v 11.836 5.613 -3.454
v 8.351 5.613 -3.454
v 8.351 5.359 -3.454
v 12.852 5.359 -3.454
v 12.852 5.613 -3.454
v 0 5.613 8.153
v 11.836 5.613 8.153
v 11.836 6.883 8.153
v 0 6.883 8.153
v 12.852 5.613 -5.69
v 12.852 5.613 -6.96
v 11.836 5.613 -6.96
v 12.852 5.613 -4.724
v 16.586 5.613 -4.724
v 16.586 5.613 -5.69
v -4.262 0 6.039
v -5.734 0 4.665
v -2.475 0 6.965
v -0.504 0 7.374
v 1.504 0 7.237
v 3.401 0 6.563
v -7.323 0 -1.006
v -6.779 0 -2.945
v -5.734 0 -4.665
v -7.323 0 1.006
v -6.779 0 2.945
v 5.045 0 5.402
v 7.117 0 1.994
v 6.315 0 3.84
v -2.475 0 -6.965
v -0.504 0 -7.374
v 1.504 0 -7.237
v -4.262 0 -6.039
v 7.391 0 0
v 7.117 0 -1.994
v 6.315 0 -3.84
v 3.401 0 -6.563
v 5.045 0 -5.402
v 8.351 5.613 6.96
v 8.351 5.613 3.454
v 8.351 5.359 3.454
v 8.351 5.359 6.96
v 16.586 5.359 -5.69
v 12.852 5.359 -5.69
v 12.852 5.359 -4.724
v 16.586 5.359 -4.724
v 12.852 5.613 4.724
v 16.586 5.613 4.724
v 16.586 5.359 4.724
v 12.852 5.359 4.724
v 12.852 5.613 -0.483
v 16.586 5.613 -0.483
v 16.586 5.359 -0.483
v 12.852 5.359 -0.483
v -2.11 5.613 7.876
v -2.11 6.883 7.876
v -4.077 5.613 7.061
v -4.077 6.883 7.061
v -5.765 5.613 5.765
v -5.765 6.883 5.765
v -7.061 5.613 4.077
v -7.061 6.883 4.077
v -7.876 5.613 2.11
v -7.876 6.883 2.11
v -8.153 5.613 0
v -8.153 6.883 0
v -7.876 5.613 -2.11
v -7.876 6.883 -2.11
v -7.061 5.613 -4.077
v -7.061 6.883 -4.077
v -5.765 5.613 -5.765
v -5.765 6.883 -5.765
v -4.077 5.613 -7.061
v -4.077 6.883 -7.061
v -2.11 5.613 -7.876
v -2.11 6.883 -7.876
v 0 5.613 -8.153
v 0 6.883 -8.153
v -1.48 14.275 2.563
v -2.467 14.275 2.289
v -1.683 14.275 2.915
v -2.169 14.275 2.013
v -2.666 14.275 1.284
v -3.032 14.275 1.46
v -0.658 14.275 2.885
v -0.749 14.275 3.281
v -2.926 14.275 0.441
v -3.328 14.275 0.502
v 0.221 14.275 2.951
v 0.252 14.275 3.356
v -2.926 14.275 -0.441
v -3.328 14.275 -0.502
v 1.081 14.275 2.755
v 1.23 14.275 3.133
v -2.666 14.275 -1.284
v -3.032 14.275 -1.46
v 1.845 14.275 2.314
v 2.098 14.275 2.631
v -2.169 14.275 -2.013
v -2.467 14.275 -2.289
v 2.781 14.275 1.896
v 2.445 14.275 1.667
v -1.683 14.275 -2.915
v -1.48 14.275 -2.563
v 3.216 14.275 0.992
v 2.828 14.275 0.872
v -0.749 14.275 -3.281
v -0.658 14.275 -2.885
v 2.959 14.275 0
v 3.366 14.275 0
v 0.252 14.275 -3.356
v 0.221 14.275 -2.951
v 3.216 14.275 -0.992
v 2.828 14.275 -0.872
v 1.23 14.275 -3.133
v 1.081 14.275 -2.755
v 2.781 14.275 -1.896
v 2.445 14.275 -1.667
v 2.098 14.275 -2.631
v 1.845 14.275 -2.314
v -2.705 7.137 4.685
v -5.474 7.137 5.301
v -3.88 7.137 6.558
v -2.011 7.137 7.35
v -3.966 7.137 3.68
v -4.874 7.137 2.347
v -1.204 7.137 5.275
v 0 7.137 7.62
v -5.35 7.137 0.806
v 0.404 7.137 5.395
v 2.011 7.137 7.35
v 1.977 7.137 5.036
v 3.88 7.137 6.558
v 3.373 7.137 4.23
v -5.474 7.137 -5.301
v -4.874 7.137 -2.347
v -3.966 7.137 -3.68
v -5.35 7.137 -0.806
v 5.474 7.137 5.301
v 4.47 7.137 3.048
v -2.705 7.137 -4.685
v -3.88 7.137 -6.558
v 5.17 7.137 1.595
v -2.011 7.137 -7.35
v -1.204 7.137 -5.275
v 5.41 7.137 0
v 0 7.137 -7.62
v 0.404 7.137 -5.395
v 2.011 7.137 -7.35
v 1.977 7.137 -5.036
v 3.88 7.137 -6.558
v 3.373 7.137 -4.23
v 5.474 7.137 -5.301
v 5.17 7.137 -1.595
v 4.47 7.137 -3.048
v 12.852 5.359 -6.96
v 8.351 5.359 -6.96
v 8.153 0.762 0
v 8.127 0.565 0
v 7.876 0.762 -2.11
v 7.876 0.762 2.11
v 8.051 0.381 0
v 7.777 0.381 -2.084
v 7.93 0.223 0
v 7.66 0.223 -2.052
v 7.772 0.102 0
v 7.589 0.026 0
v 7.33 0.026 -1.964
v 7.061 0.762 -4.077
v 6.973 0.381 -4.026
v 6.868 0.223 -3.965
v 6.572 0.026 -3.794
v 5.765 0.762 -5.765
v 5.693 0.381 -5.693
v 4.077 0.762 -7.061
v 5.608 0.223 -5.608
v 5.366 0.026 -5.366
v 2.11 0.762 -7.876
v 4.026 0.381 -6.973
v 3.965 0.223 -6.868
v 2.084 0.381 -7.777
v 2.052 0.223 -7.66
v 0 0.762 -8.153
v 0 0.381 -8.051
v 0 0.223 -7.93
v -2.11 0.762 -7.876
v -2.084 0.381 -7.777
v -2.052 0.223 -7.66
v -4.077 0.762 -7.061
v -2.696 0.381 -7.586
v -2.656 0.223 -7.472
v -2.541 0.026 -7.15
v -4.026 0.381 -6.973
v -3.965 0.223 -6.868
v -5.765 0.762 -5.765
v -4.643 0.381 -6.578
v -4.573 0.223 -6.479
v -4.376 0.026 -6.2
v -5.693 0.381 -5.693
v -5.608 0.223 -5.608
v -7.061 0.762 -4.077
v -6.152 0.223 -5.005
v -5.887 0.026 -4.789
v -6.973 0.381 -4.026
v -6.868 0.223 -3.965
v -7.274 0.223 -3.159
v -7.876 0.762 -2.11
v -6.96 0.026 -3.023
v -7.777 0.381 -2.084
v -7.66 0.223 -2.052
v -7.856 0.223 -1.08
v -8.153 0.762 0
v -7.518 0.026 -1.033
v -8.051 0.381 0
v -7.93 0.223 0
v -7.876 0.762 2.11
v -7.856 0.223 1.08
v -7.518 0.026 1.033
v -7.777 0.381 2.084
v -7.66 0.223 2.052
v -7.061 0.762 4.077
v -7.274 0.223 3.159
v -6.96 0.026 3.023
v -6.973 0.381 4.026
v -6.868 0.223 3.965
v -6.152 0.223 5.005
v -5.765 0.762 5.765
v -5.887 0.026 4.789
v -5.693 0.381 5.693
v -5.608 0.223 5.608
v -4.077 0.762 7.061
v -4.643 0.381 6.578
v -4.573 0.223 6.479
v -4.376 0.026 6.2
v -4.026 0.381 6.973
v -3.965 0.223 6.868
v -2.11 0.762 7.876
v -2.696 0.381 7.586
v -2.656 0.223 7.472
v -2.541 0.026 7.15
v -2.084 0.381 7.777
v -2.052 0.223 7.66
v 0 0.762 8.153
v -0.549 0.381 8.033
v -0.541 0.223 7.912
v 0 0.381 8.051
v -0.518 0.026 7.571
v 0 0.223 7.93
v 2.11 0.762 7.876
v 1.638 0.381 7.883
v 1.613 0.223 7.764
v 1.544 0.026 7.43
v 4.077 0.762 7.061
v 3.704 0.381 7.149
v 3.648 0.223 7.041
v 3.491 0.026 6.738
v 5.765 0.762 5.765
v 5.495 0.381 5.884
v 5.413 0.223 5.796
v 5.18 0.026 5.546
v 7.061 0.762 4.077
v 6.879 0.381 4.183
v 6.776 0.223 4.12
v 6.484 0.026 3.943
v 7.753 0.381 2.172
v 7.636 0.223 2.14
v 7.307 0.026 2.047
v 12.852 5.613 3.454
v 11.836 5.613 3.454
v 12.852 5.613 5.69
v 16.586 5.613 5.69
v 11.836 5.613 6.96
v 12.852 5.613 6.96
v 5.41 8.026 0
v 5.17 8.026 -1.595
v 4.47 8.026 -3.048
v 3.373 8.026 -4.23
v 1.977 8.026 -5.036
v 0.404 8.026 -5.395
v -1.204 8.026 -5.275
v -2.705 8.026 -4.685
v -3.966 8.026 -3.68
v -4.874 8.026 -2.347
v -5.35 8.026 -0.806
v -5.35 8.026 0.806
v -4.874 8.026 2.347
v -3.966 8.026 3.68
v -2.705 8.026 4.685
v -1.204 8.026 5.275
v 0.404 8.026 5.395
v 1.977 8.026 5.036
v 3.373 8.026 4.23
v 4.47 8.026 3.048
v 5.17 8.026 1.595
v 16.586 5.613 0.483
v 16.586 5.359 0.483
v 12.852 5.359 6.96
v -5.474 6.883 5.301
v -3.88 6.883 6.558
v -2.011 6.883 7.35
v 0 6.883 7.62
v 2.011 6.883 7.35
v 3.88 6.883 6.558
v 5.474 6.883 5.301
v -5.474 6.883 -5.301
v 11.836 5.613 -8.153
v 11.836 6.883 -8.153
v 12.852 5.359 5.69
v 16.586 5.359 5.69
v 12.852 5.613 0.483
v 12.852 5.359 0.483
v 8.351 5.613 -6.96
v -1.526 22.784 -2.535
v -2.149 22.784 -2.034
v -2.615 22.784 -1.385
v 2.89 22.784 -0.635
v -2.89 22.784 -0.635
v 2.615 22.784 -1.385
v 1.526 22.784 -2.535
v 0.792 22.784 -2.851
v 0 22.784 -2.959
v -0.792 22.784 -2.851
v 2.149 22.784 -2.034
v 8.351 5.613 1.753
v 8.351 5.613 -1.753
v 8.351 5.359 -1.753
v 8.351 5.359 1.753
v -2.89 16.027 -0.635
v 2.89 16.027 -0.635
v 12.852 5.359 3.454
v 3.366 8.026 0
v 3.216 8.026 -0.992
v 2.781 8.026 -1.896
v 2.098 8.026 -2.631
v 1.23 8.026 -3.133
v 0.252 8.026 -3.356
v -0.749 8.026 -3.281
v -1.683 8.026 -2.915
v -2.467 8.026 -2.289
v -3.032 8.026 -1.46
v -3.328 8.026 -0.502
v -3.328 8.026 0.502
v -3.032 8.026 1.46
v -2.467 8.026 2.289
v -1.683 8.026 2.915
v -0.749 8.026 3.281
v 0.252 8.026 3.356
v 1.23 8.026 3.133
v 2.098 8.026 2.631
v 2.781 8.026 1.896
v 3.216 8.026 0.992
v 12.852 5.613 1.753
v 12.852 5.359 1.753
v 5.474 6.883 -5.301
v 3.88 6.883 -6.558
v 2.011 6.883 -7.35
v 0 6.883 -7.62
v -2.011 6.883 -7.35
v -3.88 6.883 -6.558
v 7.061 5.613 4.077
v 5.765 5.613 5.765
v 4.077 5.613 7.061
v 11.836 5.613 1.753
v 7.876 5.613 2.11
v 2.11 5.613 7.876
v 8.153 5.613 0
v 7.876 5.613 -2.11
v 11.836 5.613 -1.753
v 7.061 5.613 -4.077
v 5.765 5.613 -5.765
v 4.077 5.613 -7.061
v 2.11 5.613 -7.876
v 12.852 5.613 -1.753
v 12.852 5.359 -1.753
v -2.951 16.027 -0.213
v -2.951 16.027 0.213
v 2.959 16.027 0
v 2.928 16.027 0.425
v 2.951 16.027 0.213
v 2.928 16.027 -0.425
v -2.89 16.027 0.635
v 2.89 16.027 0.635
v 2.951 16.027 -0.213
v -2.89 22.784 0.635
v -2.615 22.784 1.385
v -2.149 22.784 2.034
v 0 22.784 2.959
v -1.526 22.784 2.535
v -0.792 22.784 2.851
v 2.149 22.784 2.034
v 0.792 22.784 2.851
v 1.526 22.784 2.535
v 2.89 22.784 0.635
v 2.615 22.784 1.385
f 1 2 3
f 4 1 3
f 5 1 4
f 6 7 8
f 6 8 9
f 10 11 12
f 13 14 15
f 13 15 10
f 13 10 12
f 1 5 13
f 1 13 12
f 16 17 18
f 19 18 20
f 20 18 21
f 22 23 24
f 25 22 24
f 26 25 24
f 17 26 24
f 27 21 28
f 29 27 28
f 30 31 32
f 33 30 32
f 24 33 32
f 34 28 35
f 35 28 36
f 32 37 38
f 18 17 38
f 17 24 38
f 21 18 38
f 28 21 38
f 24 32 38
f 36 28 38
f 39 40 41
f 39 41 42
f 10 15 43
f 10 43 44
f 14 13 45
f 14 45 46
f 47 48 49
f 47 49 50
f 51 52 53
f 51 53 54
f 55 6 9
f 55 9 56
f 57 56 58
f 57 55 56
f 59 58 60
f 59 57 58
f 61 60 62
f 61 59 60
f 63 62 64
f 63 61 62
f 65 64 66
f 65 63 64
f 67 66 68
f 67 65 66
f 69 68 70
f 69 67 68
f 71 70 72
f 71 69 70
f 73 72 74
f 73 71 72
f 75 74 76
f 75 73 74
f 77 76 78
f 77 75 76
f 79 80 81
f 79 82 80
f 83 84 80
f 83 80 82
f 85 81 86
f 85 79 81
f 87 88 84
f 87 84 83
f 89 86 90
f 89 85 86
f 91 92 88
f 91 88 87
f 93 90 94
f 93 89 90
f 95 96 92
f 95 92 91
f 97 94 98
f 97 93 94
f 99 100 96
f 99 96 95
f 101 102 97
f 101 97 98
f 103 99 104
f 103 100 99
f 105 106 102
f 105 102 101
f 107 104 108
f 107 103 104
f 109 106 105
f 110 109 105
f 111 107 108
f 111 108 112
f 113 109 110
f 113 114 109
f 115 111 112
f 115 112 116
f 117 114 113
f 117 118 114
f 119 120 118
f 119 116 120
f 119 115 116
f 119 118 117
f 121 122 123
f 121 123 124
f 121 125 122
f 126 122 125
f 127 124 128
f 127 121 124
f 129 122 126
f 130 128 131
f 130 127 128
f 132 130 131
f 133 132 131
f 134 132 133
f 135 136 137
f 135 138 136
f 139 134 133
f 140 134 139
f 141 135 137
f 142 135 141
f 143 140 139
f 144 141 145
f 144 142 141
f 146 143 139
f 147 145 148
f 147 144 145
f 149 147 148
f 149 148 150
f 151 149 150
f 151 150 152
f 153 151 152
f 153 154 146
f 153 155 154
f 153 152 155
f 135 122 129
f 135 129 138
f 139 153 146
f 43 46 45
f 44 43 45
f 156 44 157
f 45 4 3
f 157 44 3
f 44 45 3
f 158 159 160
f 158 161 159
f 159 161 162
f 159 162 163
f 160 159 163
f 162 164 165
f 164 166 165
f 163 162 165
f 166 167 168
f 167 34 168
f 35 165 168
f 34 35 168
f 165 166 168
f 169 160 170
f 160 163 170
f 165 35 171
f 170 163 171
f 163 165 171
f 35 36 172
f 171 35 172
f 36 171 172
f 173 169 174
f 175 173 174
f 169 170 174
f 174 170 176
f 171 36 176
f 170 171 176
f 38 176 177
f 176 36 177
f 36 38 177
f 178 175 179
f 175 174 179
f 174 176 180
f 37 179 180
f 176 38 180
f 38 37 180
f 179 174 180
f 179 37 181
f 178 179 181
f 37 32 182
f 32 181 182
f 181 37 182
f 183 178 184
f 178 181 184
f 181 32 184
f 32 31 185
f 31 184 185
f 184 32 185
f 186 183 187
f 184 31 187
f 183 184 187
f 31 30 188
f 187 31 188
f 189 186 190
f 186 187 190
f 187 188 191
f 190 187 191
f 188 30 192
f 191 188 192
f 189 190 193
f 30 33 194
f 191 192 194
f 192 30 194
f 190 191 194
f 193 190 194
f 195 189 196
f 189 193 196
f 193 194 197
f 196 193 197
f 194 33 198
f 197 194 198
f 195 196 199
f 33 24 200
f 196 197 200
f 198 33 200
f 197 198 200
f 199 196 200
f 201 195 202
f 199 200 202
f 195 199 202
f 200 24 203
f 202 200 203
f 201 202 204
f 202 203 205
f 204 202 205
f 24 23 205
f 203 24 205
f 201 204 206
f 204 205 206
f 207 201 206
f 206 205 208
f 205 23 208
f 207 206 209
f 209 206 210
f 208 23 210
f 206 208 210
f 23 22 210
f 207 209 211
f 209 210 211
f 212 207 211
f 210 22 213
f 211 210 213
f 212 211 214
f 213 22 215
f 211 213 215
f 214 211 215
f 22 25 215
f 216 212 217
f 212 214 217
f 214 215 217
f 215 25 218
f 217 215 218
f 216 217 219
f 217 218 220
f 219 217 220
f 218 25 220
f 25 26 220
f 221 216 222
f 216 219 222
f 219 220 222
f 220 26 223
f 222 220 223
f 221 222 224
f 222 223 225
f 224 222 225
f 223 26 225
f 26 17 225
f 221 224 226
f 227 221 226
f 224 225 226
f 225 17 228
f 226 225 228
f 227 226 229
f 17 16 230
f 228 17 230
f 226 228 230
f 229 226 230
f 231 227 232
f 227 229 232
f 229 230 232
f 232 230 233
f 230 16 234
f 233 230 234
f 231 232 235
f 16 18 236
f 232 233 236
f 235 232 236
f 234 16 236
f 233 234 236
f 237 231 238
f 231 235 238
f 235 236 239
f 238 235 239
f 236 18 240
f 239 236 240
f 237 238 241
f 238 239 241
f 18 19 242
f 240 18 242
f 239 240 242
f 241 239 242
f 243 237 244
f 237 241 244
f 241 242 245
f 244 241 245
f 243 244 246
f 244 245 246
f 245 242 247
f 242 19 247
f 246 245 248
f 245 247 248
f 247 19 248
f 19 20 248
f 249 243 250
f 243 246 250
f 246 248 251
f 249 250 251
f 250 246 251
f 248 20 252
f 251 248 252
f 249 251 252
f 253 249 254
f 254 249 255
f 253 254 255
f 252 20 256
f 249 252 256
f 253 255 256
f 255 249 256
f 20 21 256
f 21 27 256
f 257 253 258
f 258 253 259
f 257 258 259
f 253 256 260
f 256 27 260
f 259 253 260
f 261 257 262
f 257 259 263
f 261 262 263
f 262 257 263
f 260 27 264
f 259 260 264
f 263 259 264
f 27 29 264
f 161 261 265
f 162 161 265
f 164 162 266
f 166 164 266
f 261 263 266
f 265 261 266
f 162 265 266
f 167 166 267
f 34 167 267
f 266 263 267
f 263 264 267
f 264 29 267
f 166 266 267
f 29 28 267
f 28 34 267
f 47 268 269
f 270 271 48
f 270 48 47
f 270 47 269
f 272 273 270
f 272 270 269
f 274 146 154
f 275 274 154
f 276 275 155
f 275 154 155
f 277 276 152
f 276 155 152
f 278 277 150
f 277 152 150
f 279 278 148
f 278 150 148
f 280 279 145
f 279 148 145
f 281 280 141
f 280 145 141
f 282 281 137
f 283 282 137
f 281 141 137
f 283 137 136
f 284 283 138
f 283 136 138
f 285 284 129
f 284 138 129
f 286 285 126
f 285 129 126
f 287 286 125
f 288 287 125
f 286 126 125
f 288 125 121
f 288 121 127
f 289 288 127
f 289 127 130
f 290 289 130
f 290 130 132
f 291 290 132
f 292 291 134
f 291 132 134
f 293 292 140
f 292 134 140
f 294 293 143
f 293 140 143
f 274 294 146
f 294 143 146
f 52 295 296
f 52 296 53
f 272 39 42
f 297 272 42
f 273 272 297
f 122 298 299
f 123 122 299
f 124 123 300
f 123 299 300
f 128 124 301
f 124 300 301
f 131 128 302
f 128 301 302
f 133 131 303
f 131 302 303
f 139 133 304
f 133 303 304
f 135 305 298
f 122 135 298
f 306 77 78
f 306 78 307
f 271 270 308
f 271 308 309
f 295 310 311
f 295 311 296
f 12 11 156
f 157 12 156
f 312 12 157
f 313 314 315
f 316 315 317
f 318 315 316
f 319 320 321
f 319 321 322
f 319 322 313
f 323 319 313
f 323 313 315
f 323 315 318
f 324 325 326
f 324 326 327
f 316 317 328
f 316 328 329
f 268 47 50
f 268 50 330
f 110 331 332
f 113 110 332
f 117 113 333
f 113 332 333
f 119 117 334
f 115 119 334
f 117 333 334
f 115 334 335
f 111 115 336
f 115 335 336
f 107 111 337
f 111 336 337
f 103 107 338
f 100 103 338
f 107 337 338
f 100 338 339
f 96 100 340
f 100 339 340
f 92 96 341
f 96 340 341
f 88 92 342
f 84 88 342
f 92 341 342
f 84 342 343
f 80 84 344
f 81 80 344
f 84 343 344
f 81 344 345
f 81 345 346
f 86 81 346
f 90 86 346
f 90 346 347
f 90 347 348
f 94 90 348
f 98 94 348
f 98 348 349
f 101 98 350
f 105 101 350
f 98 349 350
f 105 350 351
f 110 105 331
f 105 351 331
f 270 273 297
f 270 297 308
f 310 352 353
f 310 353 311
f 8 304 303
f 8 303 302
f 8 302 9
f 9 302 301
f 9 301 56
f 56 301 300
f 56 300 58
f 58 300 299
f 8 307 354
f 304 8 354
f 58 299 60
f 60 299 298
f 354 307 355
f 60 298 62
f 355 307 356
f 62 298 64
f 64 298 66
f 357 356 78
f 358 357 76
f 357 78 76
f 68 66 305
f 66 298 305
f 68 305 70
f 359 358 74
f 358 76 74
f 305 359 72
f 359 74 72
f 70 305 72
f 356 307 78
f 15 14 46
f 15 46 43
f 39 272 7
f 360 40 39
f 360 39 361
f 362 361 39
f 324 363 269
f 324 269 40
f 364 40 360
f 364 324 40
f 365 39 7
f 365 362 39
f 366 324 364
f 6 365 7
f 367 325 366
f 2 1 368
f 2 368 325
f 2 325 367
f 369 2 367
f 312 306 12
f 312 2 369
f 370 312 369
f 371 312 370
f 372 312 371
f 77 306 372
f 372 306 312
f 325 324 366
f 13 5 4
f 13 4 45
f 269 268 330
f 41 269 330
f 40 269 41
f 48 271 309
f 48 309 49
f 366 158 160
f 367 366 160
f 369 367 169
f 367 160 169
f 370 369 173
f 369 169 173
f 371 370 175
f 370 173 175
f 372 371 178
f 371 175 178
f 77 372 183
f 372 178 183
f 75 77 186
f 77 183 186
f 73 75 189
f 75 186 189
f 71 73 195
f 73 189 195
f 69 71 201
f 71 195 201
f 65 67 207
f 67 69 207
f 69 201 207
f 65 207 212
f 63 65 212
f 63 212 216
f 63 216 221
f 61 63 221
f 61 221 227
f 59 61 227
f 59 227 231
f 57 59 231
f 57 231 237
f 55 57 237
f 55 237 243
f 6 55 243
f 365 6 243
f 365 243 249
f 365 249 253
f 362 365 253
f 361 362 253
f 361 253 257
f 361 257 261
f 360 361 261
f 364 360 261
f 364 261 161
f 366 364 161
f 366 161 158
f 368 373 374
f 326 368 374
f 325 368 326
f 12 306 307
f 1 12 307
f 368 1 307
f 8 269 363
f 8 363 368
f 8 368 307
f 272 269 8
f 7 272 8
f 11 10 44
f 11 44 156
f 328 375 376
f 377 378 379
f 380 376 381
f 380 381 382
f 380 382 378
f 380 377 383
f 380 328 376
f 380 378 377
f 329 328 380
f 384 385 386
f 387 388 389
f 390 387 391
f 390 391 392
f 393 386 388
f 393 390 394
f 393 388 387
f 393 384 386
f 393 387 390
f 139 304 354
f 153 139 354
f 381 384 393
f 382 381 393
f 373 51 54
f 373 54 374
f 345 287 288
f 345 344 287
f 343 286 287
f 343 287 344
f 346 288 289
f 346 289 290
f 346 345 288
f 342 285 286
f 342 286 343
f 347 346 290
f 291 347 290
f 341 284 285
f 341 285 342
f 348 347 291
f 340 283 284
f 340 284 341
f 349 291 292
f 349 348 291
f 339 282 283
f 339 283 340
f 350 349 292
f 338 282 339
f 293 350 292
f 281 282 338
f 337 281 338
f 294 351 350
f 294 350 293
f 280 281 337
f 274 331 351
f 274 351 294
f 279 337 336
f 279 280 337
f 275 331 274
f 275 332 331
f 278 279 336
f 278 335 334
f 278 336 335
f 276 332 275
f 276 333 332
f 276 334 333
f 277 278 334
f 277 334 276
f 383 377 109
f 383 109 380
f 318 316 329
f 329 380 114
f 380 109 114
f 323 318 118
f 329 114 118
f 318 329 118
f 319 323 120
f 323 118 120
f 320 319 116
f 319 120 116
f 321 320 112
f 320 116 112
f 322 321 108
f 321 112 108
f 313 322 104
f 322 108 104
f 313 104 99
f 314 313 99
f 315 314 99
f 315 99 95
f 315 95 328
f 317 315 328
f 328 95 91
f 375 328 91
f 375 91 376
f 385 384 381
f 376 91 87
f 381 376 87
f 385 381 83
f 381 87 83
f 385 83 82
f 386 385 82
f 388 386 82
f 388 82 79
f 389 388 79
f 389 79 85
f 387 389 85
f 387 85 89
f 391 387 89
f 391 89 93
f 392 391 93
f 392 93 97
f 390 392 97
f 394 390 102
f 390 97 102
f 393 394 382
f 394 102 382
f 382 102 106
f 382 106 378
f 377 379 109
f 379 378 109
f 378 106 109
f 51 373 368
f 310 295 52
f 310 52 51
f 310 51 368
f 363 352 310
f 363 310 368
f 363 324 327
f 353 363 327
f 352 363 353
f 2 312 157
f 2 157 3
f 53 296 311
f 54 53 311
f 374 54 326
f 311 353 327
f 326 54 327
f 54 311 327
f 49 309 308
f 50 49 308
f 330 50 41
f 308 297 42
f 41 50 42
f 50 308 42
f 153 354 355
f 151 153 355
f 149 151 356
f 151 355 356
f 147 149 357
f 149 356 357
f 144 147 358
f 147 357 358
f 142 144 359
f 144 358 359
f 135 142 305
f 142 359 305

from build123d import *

# Parameters (mm, degrees)
SKETCH1_R           = 8.1534
BOSS_EXTRUDE1_DEPTH = 5.6134
BOSS_EXTRUDE2_DEPTH = 1.27
BOSS_EXTRUDE3_DEPTH = 0.254
SKETCH4_R           = 5.4102
BOSS_EXTRUDE4_DEPTH = 0.889
SKETCH5_R           = 3.3655
BOSS_EXTRUDE5_DEPTH = 6.2484
SKETCH6_R           = 2.9591
BOSS_EXTRUDE6_DEPTH = 8.509
SKETCH7_W           = 8.77263503
SKETCH7_H           = 1.27
CUT_EXTRUDE1_DEPTH  = 6.7564
BOSS_EXTRUDE7_DEPTH = 0.254
LPATTERN1_COUNT     = 2
LPATTERN1_PITCH     = 5.207
LPATTERN2_COUNT     = 2
LPATTERN2_PITCH     = 5.207
FILLET1_R           = 0.762


with BuildPart() as part:
    # Sketch1 → Boss-Extrude1 (new body)
    with BuildSketch(Plane(origin=(0, 0, 0), x_dir=(1, 0, 0), z_dir=(0, 1, 0))):
        Circle(SKETCH1_R)
    extrude(amount=BOSS_EXTRUDE1_DEPTH)

    # Sketch2 → Boss-Extrude2 (add)
    with BuildSketch(Plane(origin=(0, 5.6134, 0), x_dir=(1, 0, 0), z_dir=(0, 1, 0))):
        with BuildLine():
            Line((0, 8.1534), (11.8364, 8.1534))
            Line((11.8364, 8.1534), (11.8364, -8.1534))
            Line((11.8364, -8.1534), (0, -8.1534))
            ThreePointArc((0, -8.1534), (-8.1534, 0), (0, 8.1534))
        make_face()
    extrude(amount=BOSS_EXTRUDE2_DEPTH)

    # Sketch3 → Boss-Extrude3 (add)
    with BuildSketch(Plane(origin=(0, 6.8834, 0), x_dir=(1, 0, 0), z_dir=(0, 1, 0))):
        with BuildLine():
            Line((-5.4737, 5.301227057), (-5.4737, -5.301227057))
            ThreePointArc((-5.4737, -5.301227057), (0, -7.62), (5.4737, -5.301227057))
            Line((5.4737, -5.301227057), (5.4737, 5.301227057))
            ThreePointArc((5.4737, 5.301227057), (0, 7.62), (-5.4737, 5.301227057))
        make_face()
    extrude(amount=BOSS_EXTRUDE3_DEPTH)

    # Sketch4 → Boss-Extrude4 (add)
    with BuildSketch(Plane(origin=(0, 7.1374, 0), x_dir=(1, 0, 0), z_dir=(0, 1, 0))):
        Circle(SKETCH4_R)
    extrude(amount=BOSS_EXTRUDE4_DEPTH)

    # Sketch5 → Boss-Extrude5 (add)
    with BuildSketch(Plane(origin=(0, 8.0264, 0), x_dir=(1, 0, 0), z_dir=(0, 1, 0))):
        Circle(SKETCH5_R)
    extrude(amount=BOSS_EXTRUDE5_DEPTH)

    # Sketch6 → Boss-Extrude6 (add)
    with BuildSketch(Plane(origin=(0, 14.2748, 0), x_dir=(1, 0, 0), z_dir=(0, 1, 0))):
        Circle(SKETCH6_R)
    extrude(amount=BOSS_EXTRUDE6_DEPTH)

    # Sketch7 → Cut-Extrude1 (cut)
    with BuildSketch(Plane(origin=(0, 22.7838, 0), x_dir=(1, 0, 0), z_dir=(0, 1, 0))):
        Rectangle(SKETCH7_W, SKETCH7_H)
    extrude(amount=-CUT_EXTRUDE1_DEPTH, mode=Mode.SUBTRACT)

    # Sketch8 → Boss-Extrude7 (add)
    with BuildSketch(Plane.XZ.offset(-5.6134)):
        Polygon((8.350699667, 1.7526), (12.8524, 1.7526), (12.8524, 0.4826), (16.5862, 0.4826), (16.5862, -0.4826), (12.8524, -0.4826), (12.8524, -1.7526), (8.350699667, -1.7526), align=None)
    boss_extrude7 = extrude(amount=BOSS_EXTRUDE7_DEPTH)

    # LPattern1: Boss-Extrude7 ×2
    with Locations(*[(0, 0, -i * LPATTERN1_PITCH) for i in range(1, LPATTERN1_COUNT)]):
        add(boss_extrude7)

    # LPattern2: Boss-Extrude7 ×2
    with Locations(*[(0, 0, i * LPATTERN2_PITCH) for i in range(1, LPATTERN2_COUNT)]):
        add(boss_extrude7)

    # Fillet1
    fillet1_edges = [part.edges().sort_by_distance(p)[0] for p in [
        (-8.1534, 0, 0),
    ]]
    fillet(fillet1_edges, radius=FILLET1_R)


solid = part.part
